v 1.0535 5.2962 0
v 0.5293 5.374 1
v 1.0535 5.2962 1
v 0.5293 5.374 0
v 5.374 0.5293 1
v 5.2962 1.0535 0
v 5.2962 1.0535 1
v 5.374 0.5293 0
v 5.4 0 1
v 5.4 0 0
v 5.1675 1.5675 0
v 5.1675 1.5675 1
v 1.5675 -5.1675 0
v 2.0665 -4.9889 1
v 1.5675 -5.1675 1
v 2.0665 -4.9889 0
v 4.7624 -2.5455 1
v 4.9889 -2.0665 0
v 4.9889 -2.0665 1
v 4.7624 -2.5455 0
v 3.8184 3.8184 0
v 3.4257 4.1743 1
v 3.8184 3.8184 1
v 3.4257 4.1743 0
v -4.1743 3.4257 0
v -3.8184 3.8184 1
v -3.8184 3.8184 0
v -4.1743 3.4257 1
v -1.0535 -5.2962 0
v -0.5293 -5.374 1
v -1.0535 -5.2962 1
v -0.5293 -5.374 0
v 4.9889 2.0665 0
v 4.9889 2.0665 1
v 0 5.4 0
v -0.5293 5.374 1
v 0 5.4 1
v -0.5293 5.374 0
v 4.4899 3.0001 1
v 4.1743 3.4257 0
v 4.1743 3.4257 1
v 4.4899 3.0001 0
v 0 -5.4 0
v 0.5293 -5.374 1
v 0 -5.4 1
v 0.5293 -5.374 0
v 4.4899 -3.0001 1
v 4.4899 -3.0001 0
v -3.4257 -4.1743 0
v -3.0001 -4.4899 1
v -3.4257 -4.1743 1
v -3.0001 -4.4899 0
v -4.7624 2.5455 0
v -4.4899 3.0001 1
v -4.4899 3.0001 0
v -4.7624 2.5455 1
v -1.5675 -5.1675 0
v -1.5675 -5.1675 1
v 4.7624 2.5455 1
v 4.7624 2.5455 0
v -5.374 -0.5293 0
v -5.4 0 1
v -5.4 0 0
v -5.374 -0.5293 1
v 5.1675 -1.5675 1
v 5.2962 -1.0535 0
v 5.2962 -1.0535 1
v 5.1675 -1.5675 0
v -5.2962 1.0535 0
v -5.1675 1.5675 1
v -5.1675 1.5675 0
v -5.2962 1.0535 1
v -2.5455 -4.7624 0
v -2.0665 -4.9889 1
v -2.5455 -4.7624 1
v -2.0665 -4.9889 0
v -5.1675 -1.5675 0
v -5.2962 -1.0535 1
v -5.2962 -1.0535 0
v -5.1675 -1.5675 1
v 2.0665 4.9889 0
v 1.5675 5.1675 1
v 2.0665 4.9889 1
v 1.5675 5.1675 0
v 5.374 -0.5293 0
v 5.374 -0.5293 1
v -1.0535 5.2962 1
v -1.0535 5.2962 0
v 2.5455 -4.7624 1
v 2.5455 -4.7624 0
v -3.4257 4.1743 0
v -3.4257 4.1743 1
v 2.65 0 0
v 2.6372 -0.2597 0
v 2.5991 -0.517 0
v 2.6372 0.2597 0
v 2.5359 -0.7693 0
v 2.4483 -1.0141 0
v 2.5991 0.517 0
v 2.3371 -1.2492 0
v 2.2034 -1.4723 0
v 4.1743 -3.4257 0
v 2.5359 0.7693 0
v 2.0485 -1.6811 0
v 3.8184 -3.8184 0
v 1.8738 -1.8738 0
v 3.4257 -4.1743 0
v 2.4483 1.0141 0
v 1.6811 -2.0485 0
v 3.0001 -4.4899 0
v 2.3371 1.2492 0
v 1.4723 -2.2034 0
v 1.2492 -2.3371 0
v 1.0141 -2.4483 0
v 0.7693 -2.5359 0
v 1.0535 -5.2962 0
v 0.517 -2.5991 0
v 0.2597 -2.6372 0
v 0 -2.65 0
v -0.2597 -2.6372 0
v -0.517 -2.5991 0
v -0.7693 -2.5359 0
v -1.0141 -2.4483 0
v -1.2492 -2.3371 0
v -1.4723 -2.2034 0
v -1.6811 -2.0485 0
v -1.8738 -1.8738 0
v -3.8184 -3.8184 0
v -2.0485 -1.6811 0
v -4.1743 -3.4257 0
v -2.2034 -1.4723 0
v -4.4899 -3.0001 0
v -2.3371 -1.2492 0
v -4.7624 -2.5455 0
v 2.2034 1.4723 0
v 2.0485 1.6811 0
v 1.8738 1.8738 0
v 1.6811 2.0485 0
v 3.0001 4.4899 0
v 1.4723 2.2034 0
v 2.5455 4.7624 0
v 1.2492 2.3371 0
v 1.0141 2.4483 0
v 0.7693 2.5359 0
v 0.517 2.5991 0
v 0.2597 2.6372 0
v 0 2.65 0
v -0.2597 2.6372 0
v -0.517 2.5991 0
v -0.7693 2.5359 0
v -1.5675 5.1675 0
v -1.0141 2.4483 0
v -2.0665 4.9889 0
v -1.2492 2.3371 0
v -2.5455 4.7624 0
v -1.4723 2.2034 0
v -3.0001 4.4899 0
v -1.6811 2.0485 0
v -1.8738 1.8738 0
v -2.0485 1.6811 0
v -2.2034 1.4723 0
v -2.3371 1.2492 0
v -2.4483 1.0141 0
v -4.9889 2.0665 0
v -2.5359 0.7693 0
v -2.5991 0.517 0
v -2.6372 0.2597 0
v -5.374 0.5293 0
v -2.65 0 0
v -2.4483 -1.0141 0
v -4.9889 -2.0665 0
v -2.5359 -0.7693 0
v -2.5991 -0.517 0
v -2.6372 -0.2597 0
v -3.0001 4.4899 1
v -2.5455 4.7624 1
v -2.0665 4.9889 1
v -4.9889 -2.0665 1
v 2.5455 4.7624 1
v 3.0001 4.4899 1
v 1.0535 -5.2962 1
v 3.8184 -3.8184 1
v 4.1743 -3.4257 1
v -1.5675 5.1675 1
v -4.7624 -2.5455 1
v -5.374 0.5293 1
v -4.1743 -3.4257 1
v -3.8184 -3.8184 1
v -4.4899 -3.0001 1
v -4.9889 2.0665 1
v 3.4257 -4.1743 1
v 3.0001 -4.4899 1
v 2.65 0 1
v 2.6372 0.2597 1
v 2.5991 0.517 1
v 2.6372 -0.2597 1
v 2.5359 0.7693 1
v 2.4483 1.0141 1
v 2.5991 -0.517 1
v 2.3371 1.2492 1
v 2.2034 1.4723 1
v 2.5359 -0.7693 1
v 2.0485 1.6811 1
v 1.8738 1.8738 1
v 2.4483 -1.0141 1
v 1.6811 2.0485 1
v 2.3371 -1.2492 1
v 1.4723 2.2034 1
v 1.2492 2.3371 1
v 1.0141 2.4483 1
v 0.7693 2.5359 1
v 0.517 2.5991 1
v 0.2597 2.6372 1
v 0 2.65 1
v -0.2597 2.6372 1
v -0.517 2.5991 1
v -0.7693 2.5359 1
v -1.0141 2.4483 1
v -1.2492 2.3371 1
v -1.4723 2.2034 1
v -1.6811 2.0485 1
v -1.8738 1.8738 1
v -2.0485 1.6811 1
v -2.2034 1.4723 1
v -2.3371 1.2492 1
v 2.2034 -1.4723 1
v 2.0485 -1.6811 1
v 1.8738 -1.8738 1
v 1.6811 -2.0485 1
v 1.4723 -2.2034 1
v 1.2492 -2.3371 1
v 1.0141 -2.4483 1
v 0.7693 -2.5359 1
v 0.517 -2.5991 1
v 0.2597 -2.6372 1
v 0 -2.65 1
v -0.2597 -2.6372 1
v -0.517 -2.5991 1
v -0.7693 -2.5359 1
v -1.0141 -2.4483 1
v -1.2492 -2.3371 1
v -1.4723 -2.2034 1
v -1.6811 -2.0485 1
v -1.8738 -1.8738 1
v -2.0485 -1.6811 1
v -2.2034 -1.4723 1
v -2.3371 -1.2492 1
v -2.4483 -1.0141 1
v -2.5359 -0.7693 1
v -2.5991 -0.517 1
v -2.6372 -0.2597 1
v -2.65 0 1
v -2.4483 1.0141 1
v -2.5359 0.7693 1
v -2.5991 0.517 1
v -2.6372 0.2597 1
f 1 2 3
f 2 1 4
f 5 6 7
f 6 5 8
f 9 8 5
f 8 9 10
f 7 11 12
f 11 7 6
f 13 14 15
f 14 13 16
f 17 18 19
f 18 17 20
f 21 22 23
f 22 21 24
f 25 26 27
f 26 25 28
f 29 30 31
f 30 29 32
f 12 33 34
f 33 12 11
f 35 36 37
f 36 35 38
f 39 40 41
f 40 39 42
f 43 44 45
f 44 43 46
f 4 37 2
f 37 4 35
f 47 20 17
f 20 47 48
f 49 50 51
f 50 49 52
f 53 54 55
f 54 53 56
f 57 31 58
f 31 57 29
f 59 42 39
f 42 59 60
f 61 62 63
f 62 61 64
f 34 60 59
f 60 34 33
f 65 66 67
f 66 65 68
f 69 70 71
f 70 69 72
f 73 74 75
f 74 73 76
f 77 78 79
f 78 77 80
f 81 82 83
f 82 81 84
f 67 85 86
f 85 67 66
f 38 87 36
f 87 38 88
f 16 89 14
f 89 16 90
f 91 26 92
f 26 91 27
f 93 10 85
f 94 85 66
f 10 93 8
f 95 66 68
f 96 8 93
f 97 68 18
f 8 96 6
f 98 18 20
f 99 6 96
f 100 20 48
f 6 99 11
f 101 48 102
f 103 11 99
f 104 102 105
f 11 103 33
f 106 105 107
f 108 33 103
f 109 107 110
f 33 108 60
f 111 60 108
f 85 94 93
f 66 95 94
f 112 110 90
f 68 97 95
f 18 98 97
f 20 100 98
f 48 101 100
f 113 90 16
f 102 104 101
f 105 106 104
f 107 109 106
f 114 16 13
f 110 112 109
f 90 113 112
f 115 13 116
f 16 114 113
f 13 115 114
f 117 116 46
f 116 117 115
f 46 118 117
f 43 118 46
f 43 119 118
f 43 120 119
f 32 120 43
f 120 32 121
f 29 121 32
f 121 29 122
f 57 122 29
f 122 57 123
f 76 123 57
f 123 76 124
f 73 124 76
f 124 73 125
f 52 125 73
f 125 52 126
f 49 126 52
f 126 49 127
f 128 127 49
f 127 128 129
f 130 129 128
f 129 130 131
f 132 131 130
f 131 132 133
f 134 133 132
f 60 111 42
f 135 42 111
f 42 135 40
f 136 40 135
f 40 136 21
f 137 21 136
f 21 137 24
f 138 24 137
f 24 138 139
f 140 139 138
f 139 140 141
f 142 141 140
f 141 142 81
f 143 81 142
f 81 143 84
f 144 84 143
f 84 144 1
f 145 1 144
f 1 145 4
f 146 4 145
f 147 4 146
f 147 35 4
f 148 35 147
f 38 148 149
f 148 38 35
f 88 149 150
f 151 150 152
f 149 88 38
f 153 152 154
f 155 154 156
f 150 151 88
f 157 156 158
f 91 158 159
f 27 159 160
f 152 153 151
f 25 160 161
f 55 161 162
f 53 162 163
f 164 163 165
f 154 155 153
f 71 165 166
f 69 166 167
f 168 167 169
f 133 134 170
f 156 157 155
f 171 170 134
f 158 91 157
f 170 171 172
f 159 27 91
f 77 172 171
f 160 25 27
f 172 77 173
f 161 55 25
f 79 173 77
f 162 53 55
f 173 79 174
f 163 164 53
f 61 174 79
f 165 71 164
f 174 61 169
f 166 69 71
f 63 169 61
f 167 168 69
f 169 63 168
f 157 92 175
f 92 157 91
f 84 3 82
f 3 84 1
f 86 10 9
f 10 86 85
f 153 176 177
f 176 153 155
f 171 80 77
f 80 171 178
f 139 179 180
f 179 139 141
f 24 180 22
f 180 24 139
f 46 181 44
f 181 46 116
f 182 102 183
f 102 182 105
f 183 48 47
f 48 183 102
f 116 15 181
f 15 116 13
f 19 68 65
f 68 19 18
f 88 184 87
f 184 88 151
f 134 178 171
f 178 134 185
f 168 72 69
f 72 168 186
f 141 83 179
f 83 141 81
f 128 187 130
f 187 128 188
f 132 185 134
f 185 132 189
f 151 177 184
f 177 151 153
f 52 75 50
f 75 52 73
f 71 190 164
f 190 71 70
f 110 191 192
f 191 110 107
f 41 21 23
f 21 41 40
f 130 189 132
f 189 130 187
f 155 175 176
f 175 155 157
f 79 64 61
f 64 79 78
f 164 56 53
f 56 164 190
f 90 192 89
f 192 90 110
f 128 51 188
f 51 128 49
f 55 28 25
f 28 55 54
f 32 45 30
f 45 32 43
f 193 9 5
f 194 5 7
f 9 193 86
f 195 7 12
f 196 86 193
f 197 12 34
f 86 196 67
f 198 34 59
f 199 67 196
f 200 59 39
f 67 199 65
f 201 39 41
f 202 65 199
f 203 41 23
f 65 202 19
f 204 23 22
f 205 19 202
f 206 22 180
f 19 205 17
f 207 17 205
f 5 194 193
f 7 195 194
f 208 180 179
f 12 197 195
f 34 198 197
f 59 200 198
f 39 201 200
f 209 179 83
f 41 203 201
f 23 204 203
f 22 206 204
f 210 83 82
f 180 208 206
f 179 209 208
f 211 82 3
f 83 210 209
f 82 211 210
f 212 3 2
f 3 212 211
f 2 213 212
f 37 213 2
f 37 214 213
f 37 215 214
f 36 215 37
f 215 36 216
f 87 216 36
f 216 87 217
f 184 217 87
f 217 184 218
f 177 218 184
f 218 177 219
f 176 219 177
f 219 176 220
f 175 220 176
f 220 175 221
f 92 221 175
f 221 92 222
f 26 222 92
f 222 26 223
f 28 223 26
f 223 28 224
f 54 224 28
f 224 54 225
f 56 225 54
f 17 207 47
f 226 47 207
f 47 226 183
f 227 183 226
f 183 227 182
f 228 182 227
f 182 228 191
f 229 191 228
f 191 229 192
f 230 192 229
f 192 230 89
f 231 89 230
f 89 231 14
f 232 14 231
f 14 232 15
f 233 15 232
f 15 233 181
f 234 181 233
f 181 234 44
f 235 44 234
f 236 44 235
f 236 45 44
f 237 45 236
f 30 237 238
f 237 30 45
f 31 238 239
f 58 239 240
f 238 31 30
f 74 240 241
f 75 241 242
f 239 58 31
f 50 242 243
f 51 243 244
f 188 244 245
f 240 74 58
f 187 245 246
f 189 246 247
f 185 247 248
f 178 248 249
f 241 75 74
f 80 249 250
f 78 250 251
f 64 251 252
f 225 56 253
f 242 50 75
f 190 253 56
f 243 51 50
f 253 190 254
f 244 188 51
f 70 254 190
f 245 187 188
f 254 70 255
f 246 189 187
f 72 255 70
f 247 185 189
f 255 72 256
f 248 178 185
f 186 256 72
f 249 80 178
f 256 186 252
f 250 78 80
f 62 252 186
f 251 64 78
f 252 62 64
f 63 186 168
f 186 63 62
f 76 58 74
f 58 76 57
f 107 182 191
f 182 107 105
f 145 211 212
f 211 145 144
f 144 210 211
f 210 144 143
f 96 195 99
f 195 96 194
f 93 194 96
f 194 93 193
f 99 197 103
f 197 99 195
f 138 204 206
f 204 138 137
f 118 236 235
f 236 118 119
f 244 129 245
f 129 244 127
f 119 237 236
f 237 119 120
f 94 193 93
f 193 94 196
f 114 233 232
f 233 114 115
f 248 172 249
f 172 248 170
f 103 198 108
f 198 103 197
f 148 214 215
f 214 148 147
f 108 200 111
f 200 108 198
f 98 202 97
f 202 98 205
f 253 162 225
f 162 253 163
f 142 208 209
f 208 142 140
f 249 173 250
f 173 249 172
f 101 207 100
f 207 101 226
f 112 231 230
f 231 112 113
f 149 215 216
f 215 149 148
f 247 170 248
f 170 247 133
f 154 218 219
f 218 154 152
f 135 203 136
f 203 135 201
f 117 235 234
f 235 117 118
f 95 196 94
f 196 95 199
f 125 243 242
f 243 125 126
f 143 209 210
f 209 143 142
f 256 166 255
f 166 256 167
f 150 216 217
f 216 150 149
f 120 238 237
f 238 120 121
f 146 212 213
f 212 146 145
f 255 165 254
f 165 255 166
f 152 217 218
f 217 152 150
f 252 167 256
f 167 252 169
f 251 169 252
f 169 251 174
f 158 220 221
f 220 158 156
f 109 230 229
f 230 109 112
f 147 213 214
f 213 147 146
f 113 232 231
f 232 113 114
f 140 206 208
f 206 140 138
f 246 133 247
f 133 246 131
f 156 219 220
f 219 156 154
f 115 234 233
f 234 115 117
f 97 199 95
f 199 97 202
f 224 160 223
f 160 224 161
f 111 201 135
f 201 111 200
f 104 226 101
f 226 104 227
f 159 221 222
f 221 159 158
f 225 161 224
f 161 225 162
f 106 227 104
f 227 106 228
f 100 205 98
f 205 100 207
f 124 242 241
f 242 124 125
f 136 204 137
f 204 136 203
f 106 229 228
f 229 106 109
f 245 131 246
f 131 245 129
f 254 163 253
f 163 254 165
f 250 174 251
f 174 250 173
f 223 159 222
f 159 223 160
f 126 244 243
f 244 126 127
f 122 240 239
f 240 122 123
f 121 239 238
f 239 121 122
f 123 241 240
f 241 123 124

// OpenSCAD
module radial() {
    difference() {
        cylinder(h=1, r=10.8/2, $fn=64);
        translate([0, 0, -0.1])
            cylinder(h=1.2, r=5.3/2, $fn=64);
    }
}

radial();
